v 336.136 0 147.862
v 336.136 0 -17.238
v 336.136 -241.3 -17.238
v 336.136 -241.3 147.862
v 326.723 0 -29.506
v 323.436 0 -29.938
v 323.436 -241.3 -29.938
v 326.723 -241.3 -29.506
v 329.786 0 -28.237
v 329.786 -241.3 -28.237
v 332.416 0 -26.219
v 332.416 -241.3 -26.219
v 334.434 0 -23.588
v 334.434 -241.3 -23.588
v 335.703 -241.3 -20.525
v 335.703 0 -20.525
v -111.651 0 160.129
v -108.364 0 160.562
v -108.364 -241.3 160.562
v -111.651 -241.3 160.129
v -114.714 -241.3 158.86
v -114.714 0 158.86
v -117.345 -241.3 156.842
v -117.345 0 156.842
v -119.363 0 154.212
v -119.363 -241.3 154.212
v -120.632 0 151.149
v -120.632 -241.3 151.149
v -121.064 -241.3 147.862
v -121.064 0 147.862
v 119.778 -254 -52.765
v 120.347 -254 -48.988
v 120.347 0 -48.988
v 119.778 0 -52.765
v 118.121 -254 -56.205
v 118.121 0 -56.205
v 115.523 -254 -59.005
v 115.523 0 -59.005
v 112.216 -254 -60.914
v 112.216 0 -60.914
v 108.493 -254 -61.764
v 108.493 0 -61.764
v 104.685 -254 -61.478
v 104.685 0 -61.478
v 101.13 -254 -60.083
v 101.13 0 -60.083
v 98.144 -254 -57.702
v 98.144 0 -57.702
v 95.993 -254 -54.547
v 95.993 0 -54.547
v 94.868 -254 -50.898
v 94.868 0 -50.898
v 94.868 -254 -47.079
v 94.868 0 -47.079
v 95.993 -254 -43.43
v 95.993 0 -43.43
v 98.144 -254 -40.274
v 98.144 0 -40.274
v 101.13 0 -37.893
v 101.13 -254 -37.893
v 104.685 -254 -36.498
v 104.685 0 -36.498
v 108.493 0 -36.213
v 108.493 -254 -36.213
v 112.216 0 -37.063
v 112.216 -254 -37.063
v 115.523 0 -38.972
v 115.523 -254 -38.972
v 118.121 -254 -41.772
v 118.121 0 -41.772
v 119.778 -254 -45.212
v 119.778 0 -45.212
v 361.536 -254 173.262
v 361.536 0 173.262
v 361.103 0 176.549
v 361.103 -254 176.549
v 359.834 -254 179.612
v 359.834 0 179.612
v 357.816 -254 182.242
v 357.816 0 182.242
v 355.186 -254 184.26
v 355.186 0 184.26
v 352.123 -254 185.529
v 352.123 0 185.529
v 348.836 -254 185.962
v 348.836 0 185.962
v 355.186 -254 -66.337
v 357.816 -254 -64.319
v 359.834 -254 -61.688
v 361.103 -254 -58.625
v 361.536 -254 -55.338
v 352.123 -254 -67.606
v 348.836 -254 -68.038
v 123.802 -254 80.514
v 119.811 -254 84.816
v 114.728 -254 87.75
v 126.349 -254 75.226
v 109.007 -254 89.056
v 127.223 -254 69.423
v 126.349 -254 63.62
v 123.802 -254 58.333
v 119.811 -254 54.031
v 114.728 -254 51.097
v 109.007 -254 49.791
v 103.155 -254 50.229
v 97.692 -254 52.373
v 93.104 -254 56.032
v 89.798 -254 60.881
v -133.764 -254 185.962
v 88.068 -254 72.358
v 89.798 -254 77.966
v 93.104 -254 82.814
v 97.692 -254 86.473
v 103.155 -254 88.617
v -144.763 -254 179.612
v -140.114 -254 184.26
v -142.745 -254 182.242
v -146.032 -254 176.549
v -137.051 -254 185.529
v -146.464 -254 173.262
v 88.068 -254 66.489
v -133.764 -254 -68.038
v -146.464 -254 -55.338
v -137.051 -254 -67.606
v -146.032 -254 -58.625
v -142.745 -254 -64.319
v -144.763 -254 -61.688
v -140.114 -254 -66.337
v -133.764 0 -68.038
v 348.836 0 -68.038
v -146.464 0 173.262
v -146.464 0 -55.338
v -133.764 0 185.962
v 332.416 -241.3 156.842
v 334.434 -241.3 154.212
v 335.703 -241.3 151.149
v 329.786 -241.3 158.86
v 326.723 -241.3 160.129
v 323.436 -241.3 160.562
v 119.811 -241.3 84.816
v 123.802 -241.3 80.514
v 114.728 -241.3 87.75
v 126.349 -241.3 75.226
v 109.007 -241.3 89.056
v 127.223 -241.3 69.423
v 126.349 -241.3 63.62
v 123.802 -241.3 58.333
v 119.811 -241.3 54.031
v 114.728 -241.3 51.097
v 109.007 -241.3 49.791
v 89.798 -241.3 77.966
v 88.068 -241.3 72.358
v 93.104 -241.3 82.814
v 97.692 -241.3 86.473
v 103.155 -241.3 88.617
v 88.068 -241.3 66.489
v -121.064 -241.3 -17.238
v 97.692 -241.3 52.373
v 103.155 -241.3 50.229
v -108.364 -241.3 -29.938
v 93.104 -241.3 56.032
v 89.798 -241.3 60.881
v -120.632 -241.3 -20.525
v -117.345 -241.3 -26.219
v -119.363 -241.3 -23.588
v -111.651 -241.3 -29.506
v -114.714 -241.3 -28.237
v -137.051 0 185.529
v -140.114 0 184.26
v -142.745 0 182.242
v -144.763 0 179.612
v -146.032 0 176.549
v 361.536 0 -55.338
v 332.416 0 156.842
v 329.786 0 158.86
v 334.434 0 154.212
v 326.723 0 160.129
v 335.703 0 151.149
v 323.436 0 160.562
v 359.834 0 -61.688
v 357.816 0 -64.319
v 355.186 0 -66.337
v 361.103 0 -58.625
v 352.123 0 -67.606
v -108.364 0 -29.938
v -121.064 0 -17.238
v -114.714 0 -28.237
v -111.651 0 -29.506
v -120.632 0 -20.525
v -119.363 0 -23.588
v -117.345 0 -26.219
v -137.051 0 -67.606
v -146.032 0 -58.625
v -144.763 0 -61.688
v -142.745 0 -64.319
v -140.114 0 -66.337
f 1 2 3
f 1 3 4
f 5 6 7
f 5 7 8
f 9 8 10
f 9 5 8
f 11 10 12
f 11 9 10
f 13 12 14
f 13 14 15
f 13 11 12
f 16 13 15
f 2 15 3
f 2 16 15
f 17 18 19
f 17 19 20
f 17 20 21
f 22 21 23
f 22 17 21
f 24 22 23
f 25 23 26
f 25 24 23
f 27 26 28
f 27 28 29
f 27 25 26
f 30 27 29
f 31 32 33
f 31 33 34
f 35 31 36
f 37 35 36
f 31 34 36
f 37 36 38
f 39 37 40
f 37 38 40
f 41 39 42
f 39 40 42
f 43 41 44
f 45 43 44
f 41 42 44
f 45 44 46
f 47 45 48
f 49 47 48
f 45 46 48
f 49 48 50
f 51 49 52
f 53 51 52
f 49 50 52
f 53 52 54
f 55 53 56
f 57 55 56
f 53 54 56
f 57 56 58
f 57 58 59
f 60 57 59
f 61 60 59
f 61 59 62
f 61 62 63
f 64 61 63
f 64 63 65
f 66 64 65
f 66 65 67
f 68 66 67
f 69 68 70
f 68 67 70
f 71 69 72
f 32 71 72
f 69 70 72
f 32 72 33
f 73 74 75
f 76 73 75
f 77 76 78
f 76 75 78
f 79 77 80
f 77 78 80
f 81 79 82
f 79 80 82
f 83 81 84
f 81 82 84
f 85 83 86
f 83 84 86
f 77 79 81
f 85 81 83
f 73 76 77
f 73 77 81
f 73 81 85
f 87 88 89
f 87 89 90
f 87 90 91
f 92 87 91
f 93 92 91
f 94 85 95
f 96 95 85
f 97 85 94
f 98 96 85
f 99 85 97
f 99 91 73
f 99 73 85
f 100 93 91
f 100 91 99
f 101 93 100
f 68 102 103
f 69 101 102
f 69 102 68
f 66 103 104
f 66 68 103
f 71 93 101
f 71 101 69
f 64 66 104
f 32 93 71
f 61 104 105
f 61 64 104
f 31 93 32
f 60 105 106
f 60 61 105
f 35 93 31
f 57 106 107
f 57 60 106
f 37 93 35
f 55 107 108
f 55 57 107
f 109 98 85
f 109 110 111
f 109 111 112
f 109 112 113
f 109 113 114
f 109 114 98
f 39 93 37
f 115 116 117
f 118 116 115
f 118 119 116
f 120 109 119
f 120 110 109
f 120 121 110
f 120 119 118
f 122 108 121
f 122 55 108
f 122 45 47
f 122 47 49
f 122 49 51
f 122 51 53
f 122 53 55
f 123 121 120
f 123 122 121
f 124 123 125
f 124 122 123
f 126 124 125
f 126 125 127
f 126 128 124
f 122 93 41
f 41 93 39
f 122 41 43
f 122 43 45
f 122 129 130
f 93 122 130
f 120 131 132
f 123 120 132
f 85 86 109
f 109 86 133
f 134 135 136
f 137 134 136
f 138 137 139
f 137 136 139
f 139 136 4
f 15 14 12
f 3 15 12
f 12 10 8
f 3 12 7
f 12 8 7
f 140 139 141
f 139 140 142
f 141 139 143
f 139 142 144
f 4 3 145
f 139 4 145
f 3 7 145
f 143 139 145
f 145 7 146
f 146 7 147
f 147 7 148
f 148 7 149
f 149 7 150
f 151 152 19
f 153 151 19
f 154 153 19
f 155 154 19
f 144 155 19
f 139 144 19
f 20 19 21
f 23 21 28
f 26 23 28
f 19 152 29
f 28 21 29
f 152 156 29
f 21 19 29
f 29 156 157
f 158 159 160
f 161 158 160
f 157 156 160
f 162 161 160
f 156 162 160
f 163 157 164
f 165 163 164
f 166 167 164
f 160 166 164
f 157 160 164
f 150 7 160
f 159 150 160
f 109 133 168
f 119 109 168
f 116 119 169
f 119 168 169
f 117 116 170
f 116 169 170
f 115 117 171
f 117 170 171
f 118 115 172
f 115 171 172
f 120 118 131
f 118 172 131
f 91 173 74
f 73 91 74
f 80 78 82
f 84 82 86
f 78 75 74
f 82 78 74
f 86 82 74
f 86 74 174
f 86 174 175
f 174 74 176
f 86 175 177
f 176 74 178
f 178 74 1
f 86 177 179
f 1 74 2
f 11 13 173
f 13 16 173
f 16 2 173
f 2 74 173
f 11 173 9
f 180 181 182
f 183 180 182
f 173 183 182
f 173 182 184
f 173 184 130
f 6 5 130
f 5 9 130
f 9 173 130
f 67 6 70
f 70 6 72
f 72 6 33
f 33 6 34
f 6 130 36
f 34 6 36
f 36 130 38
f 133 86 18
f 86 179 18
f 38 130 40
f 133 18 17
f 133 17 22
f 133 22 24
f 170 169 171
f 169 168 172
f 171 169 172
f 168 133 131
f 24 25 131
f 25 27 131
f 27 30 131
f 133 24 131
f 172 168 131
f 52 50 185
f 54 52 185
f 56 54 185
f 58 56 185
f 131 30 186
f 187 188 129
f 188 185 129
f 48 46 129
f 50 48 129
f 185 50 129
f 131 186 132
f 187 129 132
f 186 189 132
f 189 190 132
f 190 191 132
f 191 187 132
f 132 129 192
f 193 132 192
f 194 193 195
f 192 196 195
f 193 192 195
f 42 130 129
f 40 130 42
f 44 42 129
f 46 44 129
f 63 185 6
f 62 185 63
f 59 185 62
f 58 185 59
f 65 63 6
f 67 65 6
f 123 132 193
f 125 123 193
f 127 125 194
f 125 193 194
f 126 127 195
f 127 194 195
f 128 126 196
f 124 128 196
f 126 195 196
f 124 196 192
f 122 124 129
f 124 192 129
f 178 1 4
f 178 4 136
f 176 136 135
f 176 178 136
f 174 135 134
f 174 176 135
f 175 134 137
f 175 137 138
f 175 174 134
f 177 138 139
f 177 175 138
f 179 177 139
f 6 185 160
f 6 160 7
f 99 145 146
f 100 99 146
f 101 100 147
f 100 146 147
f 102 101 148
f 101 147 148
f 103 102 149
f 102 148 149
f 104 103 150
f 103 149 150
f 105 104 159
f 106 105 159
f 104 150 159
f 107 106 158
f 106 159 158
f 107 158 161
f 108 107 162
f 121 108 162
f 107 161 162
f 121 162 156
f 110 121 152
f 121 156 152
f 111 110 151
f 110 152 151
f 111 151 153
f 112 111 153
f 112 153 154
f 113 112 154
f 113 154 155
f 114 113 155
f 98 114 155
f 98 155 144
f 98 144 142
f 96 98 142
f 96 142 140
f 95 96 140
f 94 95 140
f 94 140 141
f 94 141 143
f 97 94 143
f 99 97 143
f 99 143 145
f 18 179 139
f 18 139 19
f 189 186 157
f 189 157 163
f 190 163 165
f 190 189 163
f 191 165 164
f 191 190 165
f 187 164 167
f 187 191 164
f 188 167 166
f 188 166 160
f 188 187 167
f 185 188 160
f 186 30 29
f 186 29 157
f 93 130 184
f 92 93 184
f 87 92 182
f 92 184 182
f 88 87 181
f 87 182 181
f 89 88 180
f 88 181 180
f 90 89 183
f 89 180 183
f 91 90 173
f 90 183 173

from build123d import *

# Parameters (mm, degrees)
SKETCH1_R           = 12.811295034
SKETCH1_R_2         = 19.687662737
BOSS_EXTRUDE1_DEPTH = 254
CUT_EXTRUDE1_DEPTH  = 241.3


with BuildPart() as part:
    # Sketch1 → Boss-Extrude1 (new body)
    with BuildSketch(Plane(origin=(0, 0, 0), x_dir=(1, 0, 0), z_dir=(0, 1, 0))):
        with BuildLine():
            Line((-133.764264849, 68.038364167), (348.835735151, 68.038364167))
            ThreePointArc((348.835735151, 68.038364167), (357.815991272, 64.318620289), (361.535735151, 55.338364167))
            Line((361.535735151, 55.338364167), (361.535735151, -173.261635833))
            ThreePointArc((361.535735151, -173.261635833), (357.815991272, -182.241891954), (348.835735151, -185.961635833))
            Line((348.835735151, -185.961635833), (-133.764264849, -185.961635833))
            ThreePointArc((-133.764264849, -185.961635833), (-142.74452097, -182.241891954), (-146.464264849, -173.261635833))
            Line((-146.464264849, -173.261635833), (-146.464264849, 55.338364167))
            ThreePointArc((-146.464264849, 55.338364167), (-142.74452097, 64.318620289), (-133.764264849, 68.038364167))
        make_face()
        with Locations((107.535735151, 48.988364167)):
            Circle(SKETCH1_R, mode=Mode.SUBTRACT)
        with Locations((107.535735151, -69.423369036)):
            Circle(SKETCH1_R_2, mode=Mode.SUBTRACT)
    extrude(amount=-BOSS_EXTRUDE1_DEPTH)

    # Sketch2 → Cut-Extrude1 (cut)
    with BuildSketch(Plane(origin=(0, 0, 0), x_dir=(1, 0, 0), z_dir=(0, 1, 0))):
        with BuildLine():
            Line((-108.364264849, 29.938364167), (323.435735151, 29.938364167))
            ThreePointArc((323.435735151, 29.938364167), (332.415991272, 26.218620289), (336.135735151, 17.238364167))
            Line((336.135735151, 17.238364167), (336.135735151, -147.861635833))
            ThreePointArc((336.135735151, -147.861635833), (332.415991272, -156.841891954), (323.435735151, -160.561635833))
            Line((323.435735151, -160.561635833), (-108.364264849, -160.561635833))
            ThreePointArc((-108.364264849, -160.561635833), (-117.34452097, -156.841891954), (-121.064264849, -147.861635833))
            Line((-121.064264849, -147.861635833), (-121.064264849, 17.238364167))
            ThreePointArc((-121.064264849, 17.238364167), (-117.34452097, 26.218620289), (-108.364264849, 29.938364167))
        make_face()
    extrude(amount=-CUT_EXTRUDE1_DEPTH, mode=Mode.SUBTRACT)


solid = part.part
